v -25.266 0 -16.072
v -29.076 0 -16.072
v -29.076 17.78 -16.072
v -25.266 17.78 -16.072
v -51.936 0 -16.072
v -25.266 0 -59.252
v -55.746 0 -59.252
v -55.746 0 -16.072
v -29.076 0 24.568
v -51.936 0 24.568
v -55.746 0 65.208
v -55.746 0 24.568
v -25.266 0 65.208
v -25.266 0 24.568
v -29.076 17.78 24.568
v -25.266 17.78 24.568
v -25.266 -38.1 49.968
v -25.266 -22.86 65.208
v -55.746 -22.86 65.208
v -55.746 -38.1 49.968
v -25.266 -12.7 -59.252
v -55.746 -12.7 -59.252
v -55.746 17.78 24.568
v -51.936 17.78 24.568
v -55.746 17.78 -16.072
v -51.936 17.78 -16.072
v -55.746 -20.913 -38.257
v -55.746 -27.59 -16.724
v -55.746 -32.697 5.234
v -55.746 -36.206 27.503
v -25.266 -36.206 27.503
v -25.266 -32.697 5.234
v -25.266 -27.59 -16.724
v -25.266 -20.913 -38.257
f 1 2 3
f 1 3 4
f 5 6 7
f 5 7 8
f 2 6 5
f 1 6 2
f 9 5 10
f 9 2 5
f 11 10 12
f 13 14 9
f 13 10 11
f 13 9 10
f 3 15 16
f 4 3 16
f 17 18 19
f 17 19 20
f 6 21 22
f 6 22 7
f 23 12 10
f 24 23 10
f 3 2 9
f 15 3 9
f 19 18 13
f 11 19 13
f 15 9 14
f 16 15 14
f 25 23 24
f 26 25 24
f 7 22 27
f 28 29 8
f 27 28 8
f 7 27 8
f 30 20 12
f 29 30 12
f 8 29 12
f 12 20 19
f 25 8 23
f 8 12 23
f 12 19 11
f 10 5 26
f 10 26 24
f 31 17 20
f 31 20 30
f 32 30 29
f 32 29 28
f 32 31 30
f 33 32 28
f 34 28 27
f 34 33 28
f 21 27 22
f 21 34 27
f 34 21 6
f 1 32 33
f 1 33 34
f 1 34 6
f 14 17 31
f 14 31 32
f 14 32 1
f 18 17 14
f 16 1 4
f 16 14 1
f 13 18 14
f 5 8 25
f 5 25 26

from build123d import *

# Parameters (mm, degrees)
F1_DEPTH      = 7.62
F0_W          = 3.81
F0_H          = 40.64
F2_DEPTH      = 17.78
F2_DEPTH_BACK = 7.62
F4_DEPTH      = 30.48
F6_DEPTH      = 50.8


# Not quite as in the source:
# - a feature names something its author has since deleted; it is built from what else it names


with BuildPart() as f1:
    # F0 (on Front) → F1 (new body)
    with BuildSketch(Plane.XZ):
        Polygon((-25.2661056346, 42.3477623217), (-55.7461056346, 42.3477623217), (-55.7461056346, 24.5677623217), (-51.9361056346, 24.5677623217), (-51.9361056346, -16.0722376783), (-55.7461056346, -16.0722376783), (-55.7461056346, -33.8522376783), (-25.2661056346, -33.8522376783), (-25.2661056346, -16.0722376783), (-29.0761056346, -16.0722376783), (-29.0761056346, 24.5677623217), (-25.2661056346, 24.5677623217), align=None)
    extrude(amount=F1_DEPTH)

    # F0 (on Front) → F2 (join, two sides)
    with BuildSketch(Plane.XZ) as f2_sk:
        with Locations((-53.8411056346, 4.2477623217)):
            Rectangle(F0_W, F0_H)
        with Locations((-27.1711056346, 4.2477623217)):
            Rectangle(F0_W, F0_H)
    extrude(amount=-F2_DEPTH)
    extrude(f2_sk.sketch, amount=F2_DEPTH_BACK)

    # F3 (on face) → F4 (join)
    with BuildSketch(Plane.YZ.offset(-25.2661056346)):
        with BuildLine():
            Line((-7.62, 42.3477623217), (0, 42.3477623217))
            Line((0, 42.3477623217), (0, 67.7477623217))
            Line((0, 67.7477623217), (-20.32, 67.7477623217))
            Line((-20.32, 67.7477623217), (-38.1, 49.9677623217))
            ThreePointArc((-38.1, 49.9677623217), (-30.341501455, -5.7914240632), (-12.7, -59.2522376783))
            Line((-12.7, -59.2522376783), (0, -59.2522376783))
            Line((0, -59.2522376783), (0, -33.8522376783))
            Line((0, -33.8522376783), (-7.62, -33.8522376783))
            Line((-7.62, -33.8522376783), (-7.62, 42.3477623217))
        make_face()
    extrude(amount=-F4_DEPTH)

    # F5 (on face) → F6 (cut)
    with BuildSketch(Plane.YZ.offset(-25.2661056346)):
        Polygon((0, 65.2077623217), (0, 67.7477623217), (-20.32, 67.7477623217), (-22.86, 65.2077623217), align=None)
    extrude(amount=-F6_DEPTH, mode=Mode.SUBTRACT)


solid = f1.part
